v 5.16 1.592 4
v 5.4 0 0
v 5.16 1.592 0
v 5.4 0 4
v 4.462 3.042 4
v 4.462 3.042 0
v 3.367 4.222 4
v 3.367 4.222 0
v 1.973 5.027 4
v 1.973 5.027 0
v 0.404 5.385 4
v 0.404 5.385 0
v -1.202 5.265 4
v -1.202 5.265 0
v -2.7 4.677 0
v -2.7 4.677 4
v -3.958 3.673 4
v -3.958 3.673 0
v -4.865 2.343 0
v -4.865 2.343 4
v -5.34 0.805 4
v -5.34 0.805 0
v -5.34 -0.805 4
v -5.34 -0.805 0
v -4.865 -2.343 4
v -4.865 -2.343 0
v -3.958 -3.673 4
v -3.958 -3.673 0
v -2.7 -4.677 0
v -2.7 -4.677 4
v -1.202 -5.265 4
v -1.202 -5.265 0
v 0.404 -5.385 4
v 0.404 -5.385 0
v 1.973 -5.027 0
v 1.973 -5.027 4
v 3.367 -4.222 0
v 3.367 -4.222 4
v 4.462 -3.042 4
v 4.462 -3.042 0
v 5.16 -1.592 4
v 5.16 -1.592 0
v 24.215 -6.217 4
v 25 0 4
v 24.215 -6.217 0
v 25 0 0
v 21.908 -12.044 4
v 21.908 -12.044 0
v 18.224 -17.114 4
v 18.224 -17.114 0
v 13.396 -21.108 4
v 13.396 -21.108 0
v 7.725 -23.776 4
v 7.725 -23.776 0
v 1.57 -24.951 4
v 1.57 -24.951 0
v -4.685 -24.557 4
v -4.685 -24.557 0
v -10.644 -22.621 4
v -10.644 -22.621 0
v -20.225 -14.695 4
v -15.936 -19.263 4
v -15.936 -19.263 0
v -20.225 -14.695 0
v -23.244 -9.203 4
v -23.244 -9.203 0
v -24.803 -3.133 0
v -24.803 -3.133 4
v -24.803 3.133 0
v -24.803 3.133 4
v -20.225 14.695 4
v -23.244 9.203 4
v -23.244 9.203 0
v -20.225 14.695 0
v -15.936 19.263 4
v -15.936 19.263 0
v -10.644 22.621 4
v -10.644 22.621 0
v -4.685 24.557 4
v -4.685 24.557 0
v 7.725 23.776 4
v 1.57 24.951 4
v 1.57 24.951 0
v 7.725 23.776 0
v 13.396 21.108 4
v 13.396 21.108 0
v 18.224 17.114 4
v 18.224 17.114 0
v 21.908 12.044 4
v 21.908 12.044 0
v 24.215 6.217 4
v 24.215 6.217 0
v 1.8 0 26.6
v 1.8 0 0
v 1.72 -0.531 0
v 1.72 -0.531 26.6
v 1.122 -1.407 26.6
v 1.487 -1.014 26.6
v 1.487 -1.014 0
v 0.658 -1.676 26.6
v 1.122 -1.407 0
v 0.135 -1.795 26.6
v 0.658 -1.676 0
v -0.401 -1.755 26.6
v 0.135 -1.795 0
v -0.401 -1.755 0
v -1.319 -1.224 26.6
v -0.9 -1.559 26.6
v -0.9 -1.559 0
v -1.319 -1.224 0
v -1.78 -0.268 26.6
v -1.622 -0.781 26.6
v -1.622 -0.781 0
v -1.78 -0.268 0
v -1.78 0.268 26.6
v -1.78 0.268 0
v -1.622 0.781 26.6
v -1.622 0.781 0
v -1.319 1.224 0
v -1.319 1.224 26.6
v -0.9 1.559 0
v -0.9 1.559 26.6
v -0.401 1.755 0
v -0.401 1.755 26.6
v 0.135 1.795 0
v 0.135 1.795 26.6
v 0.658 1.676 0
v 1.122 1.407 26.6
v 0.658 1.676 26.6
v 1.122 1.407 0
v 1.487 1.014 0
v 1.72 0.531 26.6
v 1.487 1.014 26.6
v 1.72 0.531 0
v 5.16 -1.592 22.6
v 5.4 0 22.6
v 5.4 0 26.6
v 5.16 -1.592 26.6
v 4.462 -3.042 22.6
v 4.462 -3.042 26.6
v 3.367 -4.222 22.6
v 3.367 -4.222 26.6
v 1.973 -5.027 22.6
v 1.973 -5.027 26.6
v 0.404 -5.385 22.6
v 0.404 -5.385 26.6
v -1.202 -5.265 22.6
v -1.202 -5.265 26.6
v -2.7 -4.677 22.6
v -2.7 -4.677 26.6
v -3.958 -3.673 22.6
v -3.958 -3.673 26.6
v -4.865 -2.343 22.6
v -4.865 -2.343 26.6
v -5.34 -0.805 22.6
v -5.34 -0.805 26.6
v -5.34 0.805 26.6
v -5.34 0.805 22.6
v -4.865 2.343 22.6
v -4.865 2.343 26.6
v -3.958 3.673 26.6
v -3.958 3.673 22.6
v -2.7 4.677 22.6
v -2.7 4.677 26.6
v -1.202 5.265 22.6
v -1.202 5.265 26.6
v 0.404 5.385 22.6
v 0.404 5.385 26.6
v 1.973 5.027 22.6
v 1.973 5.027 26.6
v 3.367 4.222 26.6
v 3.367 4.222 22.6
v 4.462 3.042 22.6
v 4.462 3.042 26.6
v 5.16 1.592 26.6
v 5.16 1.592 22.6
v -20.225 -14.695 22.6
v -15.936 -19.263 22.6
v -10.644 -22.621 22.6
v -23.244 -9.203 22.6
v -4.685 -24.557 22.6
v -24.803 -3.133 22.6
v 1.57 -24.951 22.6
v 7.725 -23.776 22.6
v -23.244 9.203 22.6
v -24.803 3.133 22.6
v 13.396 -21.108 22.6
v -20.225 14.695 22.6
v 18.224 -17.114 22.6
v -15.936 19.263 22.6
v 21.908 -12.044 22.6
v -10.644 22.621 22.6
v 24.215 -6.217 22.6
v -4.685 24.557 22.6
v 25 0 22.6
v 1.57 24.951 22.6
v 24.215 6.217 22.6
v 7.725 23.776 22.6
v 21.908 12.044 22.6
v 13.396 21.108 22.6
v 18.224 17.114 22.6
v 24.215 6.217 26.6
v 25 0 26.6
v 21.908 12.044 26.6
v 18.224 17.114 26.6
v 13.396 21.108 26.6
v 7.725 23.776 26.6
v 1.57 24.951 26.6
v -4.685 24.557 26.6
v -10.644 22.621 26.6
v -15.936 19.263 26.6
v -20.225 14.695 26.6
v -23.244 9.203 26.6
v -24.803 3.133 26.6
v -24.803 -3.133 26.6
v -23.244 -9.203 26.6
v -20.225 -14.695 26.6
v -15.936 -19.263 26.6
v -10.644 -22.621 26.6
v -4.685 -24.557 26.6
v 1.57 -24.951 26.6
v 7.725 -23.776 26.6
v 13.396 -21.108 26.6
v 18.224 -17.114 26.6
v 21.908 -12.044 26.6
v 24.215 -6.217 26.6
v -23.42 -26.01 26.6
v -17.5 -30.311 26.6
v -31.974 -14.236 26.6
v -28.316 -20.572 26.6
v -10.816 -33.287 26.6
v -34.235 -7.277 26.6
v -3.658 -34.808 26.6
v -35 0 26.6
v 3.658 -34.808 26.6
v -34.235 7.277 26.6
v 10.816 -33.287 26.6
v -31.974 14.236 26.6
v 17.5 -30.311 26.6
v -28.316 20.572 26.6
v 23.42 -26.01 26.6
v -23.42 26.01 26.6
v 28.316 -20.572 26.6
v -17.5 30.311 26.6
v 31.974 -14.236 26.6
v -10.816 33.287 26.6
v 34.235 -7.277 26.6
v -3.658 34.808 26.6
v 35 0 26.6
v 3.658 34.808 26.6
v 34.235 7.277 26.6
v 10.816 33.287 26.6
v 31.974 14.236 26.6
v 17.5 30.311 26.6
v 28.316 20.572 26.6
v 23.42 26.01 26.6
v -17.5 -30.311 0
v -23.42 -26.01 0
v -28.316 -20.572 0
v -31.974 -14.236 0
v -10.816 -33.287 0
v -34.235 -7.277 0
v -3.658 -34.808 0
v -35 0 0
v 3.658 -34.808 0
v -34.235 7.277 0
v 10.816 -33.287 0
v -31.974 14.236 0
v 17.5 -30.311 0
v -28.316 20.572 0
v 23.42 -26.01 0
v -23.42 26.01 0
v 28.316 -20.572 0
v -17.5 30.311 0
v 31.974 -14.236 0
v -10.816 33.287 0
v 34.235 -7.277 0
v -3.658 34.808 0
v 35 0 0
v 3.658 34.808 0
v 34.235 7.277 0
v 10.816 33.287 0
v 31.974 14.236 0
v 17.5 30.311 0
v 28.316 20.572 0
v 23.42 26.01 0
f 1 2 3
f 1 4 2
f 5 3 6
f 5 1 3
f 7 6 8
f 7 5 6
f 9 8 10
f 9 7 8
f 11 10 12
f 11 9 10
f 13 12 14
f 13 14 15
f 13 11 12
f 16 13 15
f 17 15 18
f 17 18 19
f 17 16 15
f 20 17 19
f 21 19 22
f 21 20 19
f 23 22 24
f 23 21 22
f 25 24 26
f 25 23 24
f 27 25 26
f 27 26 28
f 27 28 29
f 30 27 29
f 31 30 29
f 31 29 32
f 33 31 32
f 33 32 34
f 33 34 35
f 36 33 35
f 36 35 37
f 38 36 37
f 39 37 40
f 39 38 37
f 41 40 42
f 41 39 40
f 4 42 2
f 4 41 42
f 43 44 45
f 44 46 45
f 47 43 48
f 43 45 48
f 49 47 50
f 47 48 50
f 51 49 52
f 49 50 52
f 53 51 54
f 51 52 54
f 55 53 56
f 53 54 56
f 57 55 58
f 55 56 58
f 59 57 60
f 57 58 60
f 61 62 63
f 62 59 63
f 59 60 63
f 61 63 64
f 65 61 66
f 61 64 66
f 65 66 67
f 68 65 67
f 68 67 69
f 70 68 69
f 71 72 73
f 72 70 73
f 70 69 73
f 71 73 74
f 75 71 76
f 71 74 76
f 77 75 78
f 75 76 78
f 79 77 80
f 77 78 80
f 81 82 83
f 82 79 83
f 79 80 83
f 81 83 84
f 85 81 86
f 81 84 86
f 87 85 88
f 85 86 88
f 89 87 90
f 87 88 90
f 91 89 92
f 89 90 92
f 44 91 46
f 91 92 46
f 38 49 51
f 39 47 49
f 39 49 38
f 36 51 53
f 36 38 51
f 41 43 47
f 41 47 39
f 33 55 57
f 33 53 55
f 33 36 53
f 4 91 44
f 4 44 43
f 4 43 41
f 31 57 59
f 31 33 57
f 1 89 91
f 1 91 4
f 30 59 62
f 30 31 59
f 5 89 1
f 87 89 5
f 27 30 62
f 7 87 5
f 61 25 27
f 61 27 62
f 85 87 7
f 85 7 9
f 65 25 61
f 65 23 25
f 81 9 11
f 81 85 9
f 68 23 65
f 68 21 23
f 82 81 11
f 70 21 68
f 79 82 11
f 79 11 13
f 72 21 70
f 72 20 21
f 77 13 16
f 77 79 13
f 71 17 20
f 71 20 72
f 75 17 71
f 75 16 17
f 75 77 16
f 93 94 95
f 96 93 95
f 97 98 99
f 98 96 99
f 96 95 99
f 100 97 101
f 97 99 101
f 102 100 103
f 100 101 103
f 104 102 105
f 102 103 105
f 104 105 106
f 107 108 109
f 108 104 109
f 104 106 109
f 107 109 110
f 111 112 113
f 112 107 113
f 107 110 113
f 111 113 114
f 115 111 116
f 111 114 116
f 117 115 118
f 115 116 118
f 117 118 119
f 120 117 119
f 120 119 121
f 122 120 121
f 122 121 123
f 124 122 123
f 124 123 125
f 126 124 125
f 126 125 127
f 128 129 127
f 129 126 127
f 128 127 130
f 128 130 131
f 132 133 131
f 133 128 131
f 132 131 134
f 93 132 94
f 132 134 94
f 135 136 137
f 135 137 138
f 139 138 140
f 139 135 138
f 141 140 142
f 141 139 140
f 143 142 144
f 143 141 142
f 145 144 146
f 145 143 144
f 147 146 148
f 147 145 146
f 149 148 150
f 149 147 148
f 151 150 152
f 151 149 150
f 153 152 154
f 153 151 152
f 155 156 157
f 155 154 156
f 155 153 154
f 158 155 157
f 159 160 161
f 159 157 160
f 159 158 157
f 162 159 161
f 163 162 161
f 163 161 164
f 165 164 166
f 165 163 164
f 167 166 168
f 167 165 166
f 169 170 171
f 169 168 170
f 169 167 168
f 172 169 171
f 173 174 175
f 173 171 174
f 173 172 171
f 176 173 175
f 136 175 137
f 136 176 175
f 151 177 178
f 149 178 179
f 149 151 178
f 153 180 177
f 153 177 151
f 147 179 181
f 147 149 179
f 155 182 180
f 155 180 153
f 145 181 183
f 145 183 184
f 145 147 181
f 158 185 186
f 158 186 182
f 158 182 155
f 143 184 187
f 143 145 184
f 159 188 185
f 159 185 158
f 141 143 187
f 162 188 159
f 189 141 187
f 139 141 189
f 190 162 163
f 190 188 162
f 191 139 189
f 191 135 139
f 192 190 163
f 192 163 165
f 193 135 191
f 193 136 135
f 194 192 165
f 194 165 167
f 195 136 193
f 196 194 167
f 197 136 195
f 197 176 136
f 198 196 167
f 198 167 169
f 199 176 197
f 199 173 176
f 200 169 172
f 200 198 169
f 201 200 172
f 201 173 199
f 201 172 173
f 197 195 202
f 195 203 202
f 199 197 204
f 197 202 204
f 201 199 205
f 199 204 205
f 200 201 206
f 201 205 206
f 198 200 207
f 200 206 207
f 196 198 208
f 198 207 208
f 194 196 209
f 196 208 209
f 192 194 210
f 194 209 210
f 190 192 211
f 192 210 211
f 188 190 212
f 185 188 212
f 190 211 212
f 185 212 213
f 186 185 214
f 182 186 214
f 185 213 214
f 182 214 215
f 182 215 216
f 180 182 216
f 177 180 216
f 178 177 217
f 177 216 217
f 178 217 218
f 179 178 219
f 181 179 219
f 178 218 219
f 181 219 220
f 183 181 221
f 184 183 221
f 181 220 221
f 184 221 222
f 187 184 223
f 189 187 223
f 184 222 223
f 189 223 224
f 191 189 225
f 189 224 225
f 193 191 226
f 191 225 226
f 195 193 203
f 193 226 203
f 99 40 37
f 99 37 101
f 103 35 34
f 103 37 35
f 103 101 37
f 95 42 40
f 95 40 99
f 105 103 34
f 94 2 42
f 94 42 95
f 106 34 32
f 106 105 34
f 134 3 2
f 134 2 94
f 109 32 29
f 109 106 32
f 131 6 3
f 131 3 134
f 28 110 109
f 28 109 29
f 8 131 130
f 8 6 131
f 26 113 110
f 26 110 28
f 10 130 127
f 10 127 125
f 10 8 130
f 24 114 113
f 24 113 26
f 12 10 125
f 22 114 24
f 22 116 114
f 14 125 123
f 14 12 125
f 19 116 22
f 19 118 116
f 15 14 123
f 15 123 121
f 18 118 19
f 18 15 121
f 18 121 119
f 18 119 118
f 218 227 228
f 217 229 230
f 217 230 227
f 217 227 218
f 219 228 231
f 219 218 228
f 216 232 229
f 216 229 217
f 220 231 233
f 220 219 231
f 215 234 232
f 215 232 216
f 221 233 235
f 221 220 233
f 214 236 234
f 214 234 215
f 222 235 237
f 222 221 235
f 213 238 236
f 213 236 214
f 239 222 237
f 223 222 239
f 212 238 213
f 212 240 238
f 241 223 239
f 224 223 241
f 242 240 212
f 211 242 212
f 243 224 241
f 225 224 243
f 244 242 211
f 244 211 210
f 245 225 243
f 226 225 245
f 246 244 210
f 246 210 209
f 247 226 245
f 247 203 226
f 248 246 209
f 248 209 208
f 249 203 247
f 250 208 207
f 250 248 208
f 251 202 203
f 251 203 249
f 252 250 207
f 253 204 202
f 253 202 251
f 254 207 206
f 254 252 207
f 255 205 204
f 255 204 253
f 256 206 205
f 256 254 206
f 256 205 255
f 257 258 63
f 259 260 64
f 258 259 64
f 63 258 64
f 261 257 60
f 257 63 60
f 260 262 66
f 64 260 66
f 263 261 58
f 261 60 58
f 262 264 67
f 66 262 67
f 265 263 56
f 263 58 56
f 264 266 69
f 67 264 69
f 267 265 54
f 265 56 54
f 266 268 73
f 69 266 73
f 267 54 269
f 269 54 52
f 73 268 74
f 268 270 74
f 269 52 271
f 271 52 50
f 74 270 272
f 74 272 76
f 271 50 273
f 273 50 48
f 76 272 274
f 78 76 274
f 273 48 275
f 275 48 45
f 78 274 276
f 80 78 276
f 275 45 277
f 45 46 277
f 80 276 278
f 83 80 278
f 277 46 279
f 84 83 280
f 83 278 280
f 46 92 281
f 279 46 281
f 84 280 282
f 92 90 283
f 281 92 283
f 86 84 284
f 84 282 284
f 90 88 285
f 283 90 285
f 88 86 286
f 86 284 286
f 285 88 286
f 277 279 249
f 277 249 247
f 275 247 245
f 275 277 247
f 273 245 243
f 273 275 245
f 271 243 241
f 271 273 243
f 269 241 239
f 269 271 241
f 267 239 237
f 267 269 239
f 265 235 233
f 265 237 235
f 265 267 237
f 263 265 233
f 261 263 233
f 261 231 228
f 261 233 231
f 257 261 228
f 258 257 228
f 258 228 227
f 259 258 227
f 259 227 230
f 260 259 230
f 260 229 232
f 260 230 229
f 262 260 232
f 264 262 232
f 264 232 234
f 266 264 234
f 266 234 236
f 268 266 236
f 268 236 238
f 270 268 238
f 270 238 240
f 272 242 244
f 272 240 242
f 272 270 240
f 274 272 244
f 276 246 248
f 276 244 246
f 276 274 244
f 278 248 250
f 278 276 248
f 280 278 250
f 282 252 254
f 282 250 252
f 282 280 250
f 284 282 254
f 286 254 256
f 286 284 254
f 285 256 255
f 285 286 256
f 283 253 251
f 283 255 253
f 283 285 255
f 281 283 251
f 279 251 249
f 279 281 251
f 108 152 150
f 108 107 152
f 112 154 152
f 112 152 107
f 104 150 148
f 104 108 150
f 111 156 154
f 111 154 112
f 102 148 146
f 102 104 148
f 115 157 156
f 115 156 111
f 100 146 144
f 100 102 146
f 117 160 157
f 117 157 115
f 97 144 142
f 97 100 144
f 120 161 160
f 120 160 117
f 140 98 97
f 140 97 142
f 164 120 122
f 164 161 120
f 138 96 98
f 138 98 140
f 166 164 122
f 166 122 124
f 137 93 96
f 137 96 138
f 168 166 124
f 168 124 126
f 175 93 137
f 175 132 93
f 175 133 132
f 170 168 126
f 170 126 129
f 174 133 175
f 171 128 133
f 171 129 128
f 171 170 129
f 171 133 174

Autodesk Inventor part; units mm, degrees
ref_plane "YZ Plane" through (0, 0, 0) normal (1, 0, 0) x (0, 1, 0)
ref_plane "XZ Plane" through (0, 0, 0) normal (0, 1, 0) x (-1, 0, 0)
sketch "Esboço2" plane through (0, 0, 0) normal (0, 0, 1) x (1, 0, 0)
  circle A0 centre (0, 0) radius 35
  dimension "d5" = 70
extrude "Extrusão2" add sketch "Esboço2" along normal blind 26.6
sketch "Esboço9" plane through (0, 0, 26.6) normal (0, 0, 1) x (1, 0, 0)
  circle A0 centre (0, 0) radius 25
  dimension "d18" = 50
extrude "Extrusão5" cut sketch "Esboço9" against normal blind 4
sketch "Esboço12" plane through (0, 0, 22.6) normal (0, 0, 1) x (1, 0, 0)
  circle A0 centre (0, 0) radius 5.4
  dimension "d24" = 10.8
extrude "Extrusão7" add sketch "Esboço12" along normal blind 4
sketch "Esboço13" plane through (0, 0, 26.6) normal (0, 0, 1) x (1, 0, 0)
  circle A0 centre (0, 0) radius 1.8
  dimension "d27" = 3.6
extrude "Extrusão8" cut sketch "Esboço13" against normal through all
ref_plane "Plano de trabalho1" through (0, 0, 13.3) normal (0, 0, 1) x (1, 0, 0)
mirror "Espelhamento2" about plane through (0, 0, 13.3) normal (0, 0, 1) of "Extrusão8", "Extrusão7", "Extrusão5"
properties part number "roda"
